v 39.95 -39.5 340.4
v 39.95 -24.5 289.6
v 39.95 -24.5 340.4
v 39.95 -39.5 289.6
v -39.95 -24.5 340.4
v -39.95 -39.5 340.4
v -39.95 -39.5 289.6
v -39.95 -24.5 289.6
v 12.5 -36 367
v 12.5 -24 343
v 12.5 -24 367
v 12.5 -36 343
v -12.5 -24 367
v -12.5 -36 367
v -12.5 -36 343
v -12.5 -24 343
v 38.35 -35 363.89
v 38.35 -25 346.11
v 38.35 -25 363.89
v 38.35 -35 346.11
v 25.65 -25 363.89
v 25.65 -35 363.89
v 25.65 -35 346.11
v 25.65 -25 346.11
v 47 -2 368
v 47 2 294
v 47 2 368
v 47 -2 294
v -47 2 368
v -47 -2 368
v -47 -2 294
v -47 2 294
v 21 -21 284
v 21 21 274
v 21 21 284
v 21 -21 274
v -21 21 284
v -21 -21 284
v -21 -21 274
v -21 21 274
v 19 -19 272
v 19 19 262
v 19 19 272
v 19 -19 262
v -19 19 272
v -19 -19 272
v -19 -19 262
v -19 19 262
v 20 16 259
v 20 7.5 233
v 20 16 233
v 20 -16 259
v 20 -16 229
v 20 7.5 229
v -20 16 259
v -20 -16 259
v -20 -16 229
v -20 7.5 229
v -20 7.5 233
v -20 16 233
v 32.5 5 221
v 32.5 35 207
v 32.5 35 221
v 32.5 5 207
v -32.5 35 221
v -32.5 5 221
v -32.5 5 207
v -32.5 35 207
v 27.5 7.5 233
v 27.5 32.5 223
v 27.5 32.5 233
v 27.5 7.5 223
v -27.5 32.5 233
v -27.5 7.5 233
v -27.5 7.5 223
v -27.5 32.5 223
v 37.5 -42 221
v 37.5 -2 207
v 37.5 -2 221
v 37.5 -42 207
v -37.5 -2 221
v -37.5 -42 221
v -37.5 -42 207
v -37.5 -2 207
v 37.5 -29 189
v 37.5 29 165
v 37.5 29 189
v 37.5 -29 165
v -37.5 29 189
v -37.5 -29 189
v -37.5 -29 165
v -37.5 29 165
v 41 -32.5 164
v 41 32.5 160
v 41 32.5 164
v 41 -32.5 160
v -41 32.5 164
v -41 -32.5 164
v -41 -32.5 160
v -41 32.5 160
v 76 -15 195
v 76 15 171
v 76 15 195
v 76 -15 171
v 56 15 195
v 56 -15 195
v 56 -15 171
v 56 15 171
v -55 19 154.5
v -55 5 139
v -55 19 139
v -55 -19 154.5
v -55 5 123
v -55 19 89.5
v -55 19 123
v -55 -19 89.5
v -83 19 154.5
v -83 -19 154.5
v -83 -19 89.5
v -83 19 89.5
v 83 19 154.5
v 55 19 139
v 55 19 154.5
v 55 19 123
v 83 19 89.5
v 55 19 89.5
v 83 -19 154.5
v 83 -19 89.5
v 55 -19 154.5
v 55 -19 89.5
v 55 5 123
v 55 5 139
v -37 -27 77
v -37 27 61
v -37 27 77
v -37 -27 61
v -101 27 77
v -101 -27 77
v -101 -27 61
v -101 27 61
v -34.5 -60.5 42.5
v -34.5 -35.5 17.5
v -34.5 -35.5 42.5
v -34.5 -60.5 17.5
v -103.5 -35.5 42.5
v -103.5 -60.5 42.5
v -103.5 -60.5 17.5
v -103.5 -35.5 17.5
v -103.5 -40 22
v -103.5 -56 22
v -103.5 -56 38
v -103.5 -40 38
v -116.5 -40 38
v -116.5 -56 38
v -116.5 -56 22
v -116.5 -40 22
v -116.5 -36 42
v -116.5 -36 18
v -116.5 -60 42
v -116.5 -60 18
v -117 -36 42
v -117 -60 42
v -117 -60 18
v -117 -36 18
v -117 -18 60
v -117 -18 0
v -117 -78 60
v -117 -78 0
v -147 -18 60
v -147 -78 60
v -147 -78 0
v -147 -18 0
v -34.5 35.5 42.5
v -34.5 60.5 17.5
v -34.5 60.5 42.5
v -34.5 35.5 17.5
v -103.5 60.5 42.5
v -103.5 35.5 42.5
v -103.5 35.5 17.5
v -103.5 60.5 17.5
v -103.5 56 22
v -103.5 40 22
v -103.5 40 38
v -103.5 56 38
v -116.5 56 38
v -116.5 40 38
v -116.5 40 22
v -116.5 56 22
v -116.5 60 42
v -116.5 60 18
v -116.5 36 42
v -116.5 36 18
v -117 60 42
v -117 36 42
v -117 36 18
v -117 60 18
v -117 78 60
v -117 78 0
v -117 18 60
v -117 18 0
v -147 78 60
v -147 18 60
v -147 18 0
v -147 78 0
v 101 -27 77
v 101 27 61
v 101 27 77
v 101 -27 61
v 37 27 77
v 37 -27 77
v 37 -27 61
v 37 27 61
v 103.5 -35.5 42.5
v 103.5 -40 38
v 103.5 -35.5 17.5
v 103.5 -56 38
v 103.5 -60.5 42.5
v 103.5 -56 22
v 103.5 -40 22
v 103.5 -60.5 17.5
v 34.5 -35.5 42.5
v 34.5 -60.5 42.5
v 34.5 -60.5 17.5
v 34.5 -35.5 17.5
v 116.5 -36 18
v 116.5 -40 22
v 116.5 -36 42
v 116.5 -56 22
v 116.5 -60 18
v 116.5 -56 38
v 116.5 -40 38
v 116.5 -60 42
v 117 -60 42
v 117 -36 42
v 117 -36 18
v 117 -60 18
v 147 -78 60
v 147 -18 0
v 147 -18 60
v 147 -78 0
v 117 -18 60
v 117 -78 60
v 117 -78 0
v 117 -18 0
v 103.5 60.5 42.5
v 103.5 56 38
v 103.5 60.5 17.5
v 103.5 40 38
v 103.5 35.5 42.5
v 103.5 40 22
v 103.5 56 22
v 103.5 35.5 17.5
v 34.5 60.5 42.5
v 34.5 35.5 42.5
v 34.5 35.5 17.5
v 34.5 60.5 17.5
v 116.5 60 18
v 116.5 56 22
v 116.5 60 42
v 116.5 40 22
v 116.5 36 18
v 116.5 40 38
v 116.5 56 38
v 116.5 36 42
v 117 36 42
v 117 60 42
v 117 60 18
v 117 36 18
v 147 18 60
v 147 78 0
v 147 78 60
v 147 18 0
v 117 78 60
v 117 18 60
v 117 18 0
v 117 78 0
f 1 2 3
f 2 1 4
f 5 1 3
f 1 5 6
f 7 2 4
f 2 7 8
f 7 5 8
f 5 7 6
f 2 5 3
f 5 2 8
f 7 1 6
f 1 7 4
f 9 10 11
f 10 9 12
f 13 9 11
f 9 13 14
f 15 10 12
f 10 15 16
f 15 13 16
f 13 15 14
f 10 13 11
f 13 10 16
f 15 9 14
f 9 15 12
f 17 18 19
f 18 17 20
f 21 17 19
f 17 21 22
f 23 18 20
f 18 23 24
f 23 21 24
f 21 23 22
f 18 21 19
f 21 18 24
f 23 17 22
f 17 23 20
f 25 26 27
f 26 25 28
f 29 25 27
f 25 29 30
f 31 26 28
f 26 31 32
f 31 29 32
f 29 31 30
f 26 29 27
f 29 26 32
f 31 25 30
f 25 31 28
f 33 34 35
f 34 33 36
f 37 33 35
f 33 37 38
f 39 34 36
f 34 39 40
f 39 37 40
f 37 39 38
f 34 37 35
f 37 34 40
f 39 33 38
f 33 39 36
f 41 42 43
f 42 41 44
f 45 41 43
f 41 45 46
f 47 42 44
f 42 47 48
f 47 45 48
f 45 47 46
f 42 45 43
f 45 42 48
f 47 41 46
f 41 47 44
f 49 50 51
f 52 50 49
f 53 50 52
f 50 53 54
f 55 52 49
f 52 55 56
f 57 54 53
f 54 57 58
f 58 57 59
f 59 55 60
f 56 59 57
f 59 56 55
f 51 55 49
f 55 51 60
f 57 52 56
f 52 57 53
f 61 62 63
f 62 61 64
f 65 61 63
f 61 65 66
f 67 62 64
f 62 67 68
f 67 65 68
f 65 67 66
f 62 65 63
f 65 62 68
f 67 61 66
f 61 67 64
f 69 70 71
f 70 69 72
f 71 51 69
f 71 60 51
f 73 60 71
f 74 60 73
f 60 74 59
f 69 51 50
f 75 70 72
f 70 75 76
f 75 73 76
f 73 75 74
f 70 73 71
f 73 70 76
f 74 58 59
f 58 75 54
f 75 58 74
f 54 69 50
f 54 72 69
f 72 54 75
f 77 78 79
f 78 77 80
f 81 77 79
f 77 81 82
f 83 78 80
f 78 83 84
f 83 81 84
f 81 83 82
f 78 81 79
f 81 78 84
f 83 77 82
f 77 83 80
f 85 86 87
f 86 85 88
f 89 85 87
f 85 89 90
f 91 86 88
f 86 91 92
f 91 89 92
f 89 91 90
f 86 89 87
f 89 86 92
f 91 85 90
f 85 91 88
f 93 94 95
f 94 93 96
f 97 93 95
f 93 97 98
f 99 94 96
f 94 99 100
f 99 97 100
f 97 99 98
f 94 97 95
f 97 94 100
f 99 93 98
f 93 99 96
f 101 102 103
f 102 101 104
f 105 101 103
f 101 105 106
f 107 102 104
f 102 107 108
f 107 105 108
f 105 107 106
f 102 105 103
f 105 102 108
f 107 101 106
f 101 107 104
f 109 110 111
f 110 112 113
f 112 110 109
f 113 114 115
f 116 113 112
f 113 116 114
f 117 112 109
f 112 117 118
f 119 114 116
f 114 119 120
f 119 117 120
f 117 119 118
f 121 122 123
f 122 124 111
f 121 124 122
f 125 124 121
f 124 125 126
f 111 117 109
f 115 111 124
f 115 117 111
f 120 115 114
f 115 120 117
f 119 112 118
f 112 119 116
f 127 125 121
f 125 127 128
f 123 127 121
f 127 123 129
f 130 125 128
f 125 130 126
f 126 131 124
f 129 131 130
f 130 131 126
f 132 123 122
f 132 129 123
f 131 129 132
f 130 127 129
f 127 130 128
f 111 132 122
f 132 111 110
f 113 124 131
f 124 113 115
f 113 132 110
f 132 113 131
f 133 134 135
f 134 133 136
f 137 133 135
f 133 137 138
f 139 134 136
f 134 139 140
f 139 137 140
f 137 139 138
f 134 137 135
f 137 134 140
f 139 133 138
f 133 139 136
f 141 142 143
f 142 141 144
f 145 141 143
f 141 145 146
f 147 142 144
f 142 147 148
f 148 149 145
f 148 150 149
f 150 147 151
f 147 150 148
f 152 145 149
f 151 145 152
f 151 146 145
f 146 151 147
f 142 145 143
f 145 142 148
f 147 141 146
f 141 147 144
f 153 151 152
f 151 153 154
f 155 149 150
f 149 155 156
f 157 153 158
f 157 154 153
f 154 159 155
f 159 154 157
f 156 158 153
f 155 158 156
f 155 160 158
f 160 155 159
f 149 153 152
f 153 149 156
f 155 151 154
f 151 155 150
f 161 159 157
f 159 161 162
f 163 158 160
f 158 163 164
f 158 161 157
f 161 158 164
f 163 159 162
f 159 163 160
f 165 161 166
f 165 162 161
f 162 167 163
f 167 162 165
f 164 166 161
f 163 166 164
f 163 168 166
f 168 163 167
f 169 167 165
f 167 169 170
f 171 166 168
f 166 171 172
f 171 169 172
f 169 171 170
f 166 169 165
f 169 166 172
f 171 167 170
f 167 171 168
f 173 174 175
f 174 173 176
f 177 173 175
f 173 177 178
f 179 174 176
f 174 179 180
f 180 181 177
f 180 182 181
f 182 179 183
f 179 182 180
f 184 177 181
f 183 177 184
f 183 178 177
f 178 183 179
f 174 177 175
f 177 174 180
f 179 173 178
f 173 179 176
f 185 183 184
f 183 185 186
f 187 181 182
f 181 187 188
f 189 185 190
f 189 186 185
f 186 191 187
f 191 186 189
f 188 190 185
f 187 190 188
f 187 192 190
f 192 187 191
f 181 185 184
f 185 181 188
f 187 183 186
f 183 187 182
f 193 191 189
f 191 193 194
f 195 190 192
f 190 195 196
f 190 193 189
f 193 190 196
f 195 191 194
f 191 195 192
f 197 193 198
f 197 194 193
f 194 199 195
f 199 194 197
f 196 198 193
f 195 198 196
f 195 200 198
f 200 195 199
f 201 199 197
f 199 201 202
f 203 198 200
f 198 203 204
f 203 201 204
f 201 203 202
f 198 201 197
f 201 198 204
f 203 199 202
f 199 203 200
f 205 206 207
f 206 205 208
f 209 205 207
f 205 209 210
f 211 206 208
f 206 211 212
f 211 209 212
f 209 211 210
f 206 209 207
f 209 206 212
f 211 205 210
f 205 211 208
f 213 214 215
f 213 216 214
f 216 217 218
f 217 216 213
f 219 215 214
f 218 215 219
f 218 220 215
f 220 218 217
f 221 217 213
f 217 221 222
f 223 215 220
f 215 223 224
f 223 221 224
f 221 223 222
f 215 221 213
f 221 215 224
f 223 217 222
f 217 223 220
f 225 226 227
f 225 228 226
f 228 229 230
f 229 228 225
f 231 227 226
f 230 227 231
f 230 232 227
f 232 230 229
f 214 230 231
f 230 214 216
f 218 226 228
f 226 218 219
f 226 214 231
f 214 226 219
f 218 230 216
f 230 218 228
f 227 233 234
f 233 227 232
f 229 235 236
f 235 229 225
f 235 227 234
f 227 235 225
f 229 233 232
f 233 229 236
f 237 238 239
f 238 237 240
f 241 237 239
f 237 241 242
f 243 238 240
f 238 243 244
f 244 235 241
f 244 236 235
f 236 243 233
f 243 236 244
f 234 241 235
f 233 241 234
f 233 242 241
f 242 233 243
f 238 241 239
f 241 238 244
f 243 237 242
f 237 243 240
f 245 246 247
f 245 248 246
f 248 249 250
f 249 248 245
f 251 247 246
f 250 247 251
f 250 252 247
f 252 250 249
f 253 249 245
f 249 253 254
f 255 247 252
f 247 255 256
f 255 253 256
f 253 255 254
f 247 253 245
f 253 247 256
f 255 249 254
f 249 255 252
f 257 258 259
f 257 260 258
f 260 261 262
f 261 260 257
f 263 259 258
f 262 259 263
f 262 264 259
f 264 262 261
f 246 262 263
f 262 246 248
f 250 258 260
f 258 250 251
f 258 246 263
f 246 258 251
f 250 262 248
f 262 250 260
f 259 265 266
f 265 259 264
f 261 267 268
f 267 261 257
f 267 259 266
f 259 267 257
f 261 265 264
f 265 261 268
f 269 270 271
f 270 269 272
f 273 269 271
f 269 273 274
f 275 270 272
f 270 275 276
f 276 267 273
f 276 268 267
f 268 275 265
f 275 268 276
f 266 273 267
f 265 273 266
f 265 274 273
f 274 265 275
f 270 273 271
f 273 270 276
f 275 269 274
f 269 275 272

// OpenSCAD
// mm. Space envelopes only; not printable production parts.
explode=0;
show_shell=false;
// H01 一体头壳 / 无嘴 暂定
if(show_shell) color([0.7450980392156863, 0.803921568627451, 0.8274509803921568],0.5) translate([0, 0, 327]) cube([110, 86, 92],center=true);
// H02 2.8英寸屏幕整板 混合
color([0.2235294117647059, 0.6509803921568628, 0.6666666666666666],0.5) translate([0, -32, 315]) cube([79.9, 15, 50.8],center=true);
// H03 IMX219摄像头 混合
color([0.2235294117647059, 0.6509803921568628, 0.6666666666666666],0.5) translate([0, -30, 355]) cube([25, 12, 24],center=true);
// H04 VL53L5CX载板 混合
color([0.2235294117647059, 0.6509803921568628, 0.6666666666666666],0.5) translate([32, -30, 355]) cube([12.7, 10, 17.78],center=true);
// H05 头内模组托架 暂定
color([0.38823529411764707, 0.4666666666666667, 0.5019607843137255],0.5) translate([0, 0, 331]) cube([94, 4, 74],center=true);
// Y01 头转台承重轴承 暂定
color([0.5882352941176471, 0.3568627450980392, 0.6784313725490196],0.5) translate([0, 0, 279]) cube([42, 42, 10],center=true);
// Y02 转台轮毂 / 限位 暂定
color([0.5882352941176471, 0.3568627450980392, 0.6784313725490196],0.5) translate([0, 0, 267]) cube([38, 38, 10],center=true);
// Y03 转向执行器 未选型
color([0.5882352941176471, 0.3568627450980392, 0.6784313725490196],0.5) translate([0, 0, 244]) cube([40, 32, 30],center=true);
// Y04 竖直承力颈座 暂定
if(show_shell) color([0.7450980392156863, 0.803921568627451, 0.8274509803921568],0.5) translate([0, 0, 248]) cube([56, 56, 55],center=true);
// B01 躯干后盖 暂定
if(show_shell) color([0.7450980392156863, 0.803921568627451, 0.8274509803921568],0.5) translate([0, 48, 193]) cube([164, 4, 72],center=true);
// B02 ZERO 3W主控 混合
color([0.16470588235294117, 0.611764705882353, 0.45098039215686275],0.5) translate([0, 20, 214]) cube([65, 30, 14],center=true);
// B03 主控散热器预留 暂定
color([0.5529411764705883, 0.5882352941176471, 0.611764705882353],0.5) translate([0, 20, 228]) cube([55, 25, 10],center=true);
// B04 电源及实时控制板 未设计
color([0.16470588235294117, 0.611764705882353, 0.45098039215686275],0.5) translate([0, -22, 214]) cube([75, 40, 14],center=true);
// B05 3S电池组含BMS 未选型
color([0.8705882352941177, 0.6862745098039216, 0.3137254901960784],0.5) translate([0, 0, 177]) cube([75, 58, 24],center=true);
// B06 电池托盘 暂定
color([0.38823529411764707, 0.4666666666666667, 0.5019607843137255],0.5) translate([0, 0, 162]) cube([82, 65, 4],center=true);
// B07 充电口/总开关 未选型
color([0.16470588235294117, 0.611764705882353, 0.45098039215686275],0.5) translate([66, 0, 183]) cube([20, 30, 24],center=true);
// B08 躯干外壳 暂定
if(show_shell) color([0.7450980392156863, 0.803921568627451, 0.8274509803921568],0.5) translate([0, 0, 196]) cube([164, 100, 78],center=true);
// L01 左承力腿 暂定
color([0.38823529411764707, 0.4666666666666667, 0.5019607843137255],0.5) translate([-69, 0, 122]) cube([28, 38, 65],center=true);
// L02 右承力腿 暂定
color([0.38823529411764707, 0.4666666666666667, 0.5019607843137255],0.5) translate([69, 0, 122]) cube([28, 38, 65],center=true);
// L03 横向承力连接 暂定
color([0.38823529411764707, 0.4666666666666667, 0.5019607843137255],0.5) translate([0, 12, 131]) cube([110, 14, 16],center=true);
// L01 L脚部检修盖 暂定
if(show_shell) color([0.7450980392156863, 0.803921568627451, 0.8274509803921568],0.5) translate([-69, 0, 88]) cube([84, 150, 4],center=true);
// L02 L双路轮驱动板 未设计
color([0.16470588235294117, 0.611764705882353, 0.45098039215686275],0.5) translate([-69, 0, 69]) cube([64, 54, 16],center=true);
// L03 L电机承力托架 暂定
if(show_shell) color([0.7450980392156863, 0.803921568627451, 0.8274509803921568],0.5) translate([-69, 0, 46]) cube([84, 150, 67],center=true);
// LFM LF轮电机 #4846 已知外包络
color([0.3254901960784314, 0.6, 0.7725490196078432],0.5) translate([-69, -48, 30]) cube([69, 25, 25],center=true);
// LFC LF输出轴/联轴器 暂定
color([0.4627450980392157, 0.5058823529411764, 0.5568627450980392],0.5) translate([-110, -48, 30]) cube([13, 16, 16],center=true);
// LFA LF承重轴承座 暂定
color([0.4627450980392157, 0.5058823529411764, 0.5568627450980392],0.5) translate([-119, -48, 30]) cube([5, 24, 24],center=true);
// LFW LF麦克纳姆轮 未选型
color([0.9294117647058824, 0.596078431372549, 0.1843137254901961],0.5) translate([-132, -48, 30]) cube([30, 60, 60],center=true);
// LBM LB轮电机 #4846 已知外包络
color([0.3254901960784314, 0.6, 0.7725490196078432],0.5) translate([-69, 48, 30]) cube([69, 25, 25],center=true);
// LBC LB输出轴/联轴器 暂定
color([0.4627450980392157, 0.5058823529411764, 0.5568627450980392],0.5) translate([-110, 48, 30]) cube([13, 16, 16],center=true);
// LBA LB承重轴承座 暂定
color([0.4627450980392157, 0.5058823529411764, 0.5568627450980392],0.5) translate([-119, 48, 30]) cube([5, 24, 24],center=true);
// LBW LB麦克纳姆轮 未选型
color([0.9294117647058824, 0.596078431372549, 0.1843137254901961],0.5) translate([-132, 48, 30]) cube([30, 60, 60],center=true);
// R01 R脚部检修盖 暂定
if(show_shell) color([0.7450980392156863, 0.803921568627451, 0.8274509803921568],0.5) translate([69, 0, 88]) cube([84, 150, 4],center=true);
// R02 R双路轮驱动板 未设计
color([0.16470588235294117, 0.611764705882353, 0.45098039215686275],0.5) translate([69, 0, 69]) cube([64, 54, 16],center=true);
// R03 R电机承力托架 暂定
if(show_shell) color([0.7450980392156863, 0.803921568627451, 0.8274509803921568],0.5) translate([69, 0, 46]) cube([84, 150, 67],center=true);
// RFM RF轮电机 #4846 已知外包络
color([0.3254901960784314, 0.6, 0.7725490196078432],0.5) translate([69, -48, 30]) cube([69, 25, 25],center=true);
// RFC RF输出轴/联轴器 暂定
color([0.4627450980392157, 0.5058823529411764, 0.5568627450980392],0.5) translate([110, -48, 30]) cube([13, 16, 16],center=true);
// RFA RF承重轴承座 暂定
color([0.4627450980392157, 0.5058823529411764, 0.5568627450980392],0.5) translate([119, -48, 30]) cube([5, 24, 24],center=true);
// RFW RF麦克纳姆轮 未选型
color([0.9294117647058824, 0.596078431372549, 0.1843137254901961],0.5) translate([132, -48, 30]) cube([30, 60, 60],center=true);
// RBM RB轮电机 #4846 已知外包络
color([0.3254901960784314, 0.6, 0.7725490196078432],0.5) translate([69, 48, 30]) cube([69, 25, 25],center=true);
// RBC RB输出轴/联轴器 暂定
color([0.4627450980392157, 0.5058823529411764, 0.5568627450980392],0.5) translate([110, 48, 30]) cube([13, 16, 16],center=true);
// RBA RB承重轴承座 暂定
color([0.4627450980392157, 0.5058823529411764, 0.5568627450980392],0.5) translate([119, 48, 30]) cube([5, 24, 24],center=true);
// RBW RB麦克纳姆轮 未选型
color([0.9294117647058824, 0.596078431372549, 0.1843137254901961],0.5) translate([132, 48, 30]) cube([30, 60, 60],center=true);
